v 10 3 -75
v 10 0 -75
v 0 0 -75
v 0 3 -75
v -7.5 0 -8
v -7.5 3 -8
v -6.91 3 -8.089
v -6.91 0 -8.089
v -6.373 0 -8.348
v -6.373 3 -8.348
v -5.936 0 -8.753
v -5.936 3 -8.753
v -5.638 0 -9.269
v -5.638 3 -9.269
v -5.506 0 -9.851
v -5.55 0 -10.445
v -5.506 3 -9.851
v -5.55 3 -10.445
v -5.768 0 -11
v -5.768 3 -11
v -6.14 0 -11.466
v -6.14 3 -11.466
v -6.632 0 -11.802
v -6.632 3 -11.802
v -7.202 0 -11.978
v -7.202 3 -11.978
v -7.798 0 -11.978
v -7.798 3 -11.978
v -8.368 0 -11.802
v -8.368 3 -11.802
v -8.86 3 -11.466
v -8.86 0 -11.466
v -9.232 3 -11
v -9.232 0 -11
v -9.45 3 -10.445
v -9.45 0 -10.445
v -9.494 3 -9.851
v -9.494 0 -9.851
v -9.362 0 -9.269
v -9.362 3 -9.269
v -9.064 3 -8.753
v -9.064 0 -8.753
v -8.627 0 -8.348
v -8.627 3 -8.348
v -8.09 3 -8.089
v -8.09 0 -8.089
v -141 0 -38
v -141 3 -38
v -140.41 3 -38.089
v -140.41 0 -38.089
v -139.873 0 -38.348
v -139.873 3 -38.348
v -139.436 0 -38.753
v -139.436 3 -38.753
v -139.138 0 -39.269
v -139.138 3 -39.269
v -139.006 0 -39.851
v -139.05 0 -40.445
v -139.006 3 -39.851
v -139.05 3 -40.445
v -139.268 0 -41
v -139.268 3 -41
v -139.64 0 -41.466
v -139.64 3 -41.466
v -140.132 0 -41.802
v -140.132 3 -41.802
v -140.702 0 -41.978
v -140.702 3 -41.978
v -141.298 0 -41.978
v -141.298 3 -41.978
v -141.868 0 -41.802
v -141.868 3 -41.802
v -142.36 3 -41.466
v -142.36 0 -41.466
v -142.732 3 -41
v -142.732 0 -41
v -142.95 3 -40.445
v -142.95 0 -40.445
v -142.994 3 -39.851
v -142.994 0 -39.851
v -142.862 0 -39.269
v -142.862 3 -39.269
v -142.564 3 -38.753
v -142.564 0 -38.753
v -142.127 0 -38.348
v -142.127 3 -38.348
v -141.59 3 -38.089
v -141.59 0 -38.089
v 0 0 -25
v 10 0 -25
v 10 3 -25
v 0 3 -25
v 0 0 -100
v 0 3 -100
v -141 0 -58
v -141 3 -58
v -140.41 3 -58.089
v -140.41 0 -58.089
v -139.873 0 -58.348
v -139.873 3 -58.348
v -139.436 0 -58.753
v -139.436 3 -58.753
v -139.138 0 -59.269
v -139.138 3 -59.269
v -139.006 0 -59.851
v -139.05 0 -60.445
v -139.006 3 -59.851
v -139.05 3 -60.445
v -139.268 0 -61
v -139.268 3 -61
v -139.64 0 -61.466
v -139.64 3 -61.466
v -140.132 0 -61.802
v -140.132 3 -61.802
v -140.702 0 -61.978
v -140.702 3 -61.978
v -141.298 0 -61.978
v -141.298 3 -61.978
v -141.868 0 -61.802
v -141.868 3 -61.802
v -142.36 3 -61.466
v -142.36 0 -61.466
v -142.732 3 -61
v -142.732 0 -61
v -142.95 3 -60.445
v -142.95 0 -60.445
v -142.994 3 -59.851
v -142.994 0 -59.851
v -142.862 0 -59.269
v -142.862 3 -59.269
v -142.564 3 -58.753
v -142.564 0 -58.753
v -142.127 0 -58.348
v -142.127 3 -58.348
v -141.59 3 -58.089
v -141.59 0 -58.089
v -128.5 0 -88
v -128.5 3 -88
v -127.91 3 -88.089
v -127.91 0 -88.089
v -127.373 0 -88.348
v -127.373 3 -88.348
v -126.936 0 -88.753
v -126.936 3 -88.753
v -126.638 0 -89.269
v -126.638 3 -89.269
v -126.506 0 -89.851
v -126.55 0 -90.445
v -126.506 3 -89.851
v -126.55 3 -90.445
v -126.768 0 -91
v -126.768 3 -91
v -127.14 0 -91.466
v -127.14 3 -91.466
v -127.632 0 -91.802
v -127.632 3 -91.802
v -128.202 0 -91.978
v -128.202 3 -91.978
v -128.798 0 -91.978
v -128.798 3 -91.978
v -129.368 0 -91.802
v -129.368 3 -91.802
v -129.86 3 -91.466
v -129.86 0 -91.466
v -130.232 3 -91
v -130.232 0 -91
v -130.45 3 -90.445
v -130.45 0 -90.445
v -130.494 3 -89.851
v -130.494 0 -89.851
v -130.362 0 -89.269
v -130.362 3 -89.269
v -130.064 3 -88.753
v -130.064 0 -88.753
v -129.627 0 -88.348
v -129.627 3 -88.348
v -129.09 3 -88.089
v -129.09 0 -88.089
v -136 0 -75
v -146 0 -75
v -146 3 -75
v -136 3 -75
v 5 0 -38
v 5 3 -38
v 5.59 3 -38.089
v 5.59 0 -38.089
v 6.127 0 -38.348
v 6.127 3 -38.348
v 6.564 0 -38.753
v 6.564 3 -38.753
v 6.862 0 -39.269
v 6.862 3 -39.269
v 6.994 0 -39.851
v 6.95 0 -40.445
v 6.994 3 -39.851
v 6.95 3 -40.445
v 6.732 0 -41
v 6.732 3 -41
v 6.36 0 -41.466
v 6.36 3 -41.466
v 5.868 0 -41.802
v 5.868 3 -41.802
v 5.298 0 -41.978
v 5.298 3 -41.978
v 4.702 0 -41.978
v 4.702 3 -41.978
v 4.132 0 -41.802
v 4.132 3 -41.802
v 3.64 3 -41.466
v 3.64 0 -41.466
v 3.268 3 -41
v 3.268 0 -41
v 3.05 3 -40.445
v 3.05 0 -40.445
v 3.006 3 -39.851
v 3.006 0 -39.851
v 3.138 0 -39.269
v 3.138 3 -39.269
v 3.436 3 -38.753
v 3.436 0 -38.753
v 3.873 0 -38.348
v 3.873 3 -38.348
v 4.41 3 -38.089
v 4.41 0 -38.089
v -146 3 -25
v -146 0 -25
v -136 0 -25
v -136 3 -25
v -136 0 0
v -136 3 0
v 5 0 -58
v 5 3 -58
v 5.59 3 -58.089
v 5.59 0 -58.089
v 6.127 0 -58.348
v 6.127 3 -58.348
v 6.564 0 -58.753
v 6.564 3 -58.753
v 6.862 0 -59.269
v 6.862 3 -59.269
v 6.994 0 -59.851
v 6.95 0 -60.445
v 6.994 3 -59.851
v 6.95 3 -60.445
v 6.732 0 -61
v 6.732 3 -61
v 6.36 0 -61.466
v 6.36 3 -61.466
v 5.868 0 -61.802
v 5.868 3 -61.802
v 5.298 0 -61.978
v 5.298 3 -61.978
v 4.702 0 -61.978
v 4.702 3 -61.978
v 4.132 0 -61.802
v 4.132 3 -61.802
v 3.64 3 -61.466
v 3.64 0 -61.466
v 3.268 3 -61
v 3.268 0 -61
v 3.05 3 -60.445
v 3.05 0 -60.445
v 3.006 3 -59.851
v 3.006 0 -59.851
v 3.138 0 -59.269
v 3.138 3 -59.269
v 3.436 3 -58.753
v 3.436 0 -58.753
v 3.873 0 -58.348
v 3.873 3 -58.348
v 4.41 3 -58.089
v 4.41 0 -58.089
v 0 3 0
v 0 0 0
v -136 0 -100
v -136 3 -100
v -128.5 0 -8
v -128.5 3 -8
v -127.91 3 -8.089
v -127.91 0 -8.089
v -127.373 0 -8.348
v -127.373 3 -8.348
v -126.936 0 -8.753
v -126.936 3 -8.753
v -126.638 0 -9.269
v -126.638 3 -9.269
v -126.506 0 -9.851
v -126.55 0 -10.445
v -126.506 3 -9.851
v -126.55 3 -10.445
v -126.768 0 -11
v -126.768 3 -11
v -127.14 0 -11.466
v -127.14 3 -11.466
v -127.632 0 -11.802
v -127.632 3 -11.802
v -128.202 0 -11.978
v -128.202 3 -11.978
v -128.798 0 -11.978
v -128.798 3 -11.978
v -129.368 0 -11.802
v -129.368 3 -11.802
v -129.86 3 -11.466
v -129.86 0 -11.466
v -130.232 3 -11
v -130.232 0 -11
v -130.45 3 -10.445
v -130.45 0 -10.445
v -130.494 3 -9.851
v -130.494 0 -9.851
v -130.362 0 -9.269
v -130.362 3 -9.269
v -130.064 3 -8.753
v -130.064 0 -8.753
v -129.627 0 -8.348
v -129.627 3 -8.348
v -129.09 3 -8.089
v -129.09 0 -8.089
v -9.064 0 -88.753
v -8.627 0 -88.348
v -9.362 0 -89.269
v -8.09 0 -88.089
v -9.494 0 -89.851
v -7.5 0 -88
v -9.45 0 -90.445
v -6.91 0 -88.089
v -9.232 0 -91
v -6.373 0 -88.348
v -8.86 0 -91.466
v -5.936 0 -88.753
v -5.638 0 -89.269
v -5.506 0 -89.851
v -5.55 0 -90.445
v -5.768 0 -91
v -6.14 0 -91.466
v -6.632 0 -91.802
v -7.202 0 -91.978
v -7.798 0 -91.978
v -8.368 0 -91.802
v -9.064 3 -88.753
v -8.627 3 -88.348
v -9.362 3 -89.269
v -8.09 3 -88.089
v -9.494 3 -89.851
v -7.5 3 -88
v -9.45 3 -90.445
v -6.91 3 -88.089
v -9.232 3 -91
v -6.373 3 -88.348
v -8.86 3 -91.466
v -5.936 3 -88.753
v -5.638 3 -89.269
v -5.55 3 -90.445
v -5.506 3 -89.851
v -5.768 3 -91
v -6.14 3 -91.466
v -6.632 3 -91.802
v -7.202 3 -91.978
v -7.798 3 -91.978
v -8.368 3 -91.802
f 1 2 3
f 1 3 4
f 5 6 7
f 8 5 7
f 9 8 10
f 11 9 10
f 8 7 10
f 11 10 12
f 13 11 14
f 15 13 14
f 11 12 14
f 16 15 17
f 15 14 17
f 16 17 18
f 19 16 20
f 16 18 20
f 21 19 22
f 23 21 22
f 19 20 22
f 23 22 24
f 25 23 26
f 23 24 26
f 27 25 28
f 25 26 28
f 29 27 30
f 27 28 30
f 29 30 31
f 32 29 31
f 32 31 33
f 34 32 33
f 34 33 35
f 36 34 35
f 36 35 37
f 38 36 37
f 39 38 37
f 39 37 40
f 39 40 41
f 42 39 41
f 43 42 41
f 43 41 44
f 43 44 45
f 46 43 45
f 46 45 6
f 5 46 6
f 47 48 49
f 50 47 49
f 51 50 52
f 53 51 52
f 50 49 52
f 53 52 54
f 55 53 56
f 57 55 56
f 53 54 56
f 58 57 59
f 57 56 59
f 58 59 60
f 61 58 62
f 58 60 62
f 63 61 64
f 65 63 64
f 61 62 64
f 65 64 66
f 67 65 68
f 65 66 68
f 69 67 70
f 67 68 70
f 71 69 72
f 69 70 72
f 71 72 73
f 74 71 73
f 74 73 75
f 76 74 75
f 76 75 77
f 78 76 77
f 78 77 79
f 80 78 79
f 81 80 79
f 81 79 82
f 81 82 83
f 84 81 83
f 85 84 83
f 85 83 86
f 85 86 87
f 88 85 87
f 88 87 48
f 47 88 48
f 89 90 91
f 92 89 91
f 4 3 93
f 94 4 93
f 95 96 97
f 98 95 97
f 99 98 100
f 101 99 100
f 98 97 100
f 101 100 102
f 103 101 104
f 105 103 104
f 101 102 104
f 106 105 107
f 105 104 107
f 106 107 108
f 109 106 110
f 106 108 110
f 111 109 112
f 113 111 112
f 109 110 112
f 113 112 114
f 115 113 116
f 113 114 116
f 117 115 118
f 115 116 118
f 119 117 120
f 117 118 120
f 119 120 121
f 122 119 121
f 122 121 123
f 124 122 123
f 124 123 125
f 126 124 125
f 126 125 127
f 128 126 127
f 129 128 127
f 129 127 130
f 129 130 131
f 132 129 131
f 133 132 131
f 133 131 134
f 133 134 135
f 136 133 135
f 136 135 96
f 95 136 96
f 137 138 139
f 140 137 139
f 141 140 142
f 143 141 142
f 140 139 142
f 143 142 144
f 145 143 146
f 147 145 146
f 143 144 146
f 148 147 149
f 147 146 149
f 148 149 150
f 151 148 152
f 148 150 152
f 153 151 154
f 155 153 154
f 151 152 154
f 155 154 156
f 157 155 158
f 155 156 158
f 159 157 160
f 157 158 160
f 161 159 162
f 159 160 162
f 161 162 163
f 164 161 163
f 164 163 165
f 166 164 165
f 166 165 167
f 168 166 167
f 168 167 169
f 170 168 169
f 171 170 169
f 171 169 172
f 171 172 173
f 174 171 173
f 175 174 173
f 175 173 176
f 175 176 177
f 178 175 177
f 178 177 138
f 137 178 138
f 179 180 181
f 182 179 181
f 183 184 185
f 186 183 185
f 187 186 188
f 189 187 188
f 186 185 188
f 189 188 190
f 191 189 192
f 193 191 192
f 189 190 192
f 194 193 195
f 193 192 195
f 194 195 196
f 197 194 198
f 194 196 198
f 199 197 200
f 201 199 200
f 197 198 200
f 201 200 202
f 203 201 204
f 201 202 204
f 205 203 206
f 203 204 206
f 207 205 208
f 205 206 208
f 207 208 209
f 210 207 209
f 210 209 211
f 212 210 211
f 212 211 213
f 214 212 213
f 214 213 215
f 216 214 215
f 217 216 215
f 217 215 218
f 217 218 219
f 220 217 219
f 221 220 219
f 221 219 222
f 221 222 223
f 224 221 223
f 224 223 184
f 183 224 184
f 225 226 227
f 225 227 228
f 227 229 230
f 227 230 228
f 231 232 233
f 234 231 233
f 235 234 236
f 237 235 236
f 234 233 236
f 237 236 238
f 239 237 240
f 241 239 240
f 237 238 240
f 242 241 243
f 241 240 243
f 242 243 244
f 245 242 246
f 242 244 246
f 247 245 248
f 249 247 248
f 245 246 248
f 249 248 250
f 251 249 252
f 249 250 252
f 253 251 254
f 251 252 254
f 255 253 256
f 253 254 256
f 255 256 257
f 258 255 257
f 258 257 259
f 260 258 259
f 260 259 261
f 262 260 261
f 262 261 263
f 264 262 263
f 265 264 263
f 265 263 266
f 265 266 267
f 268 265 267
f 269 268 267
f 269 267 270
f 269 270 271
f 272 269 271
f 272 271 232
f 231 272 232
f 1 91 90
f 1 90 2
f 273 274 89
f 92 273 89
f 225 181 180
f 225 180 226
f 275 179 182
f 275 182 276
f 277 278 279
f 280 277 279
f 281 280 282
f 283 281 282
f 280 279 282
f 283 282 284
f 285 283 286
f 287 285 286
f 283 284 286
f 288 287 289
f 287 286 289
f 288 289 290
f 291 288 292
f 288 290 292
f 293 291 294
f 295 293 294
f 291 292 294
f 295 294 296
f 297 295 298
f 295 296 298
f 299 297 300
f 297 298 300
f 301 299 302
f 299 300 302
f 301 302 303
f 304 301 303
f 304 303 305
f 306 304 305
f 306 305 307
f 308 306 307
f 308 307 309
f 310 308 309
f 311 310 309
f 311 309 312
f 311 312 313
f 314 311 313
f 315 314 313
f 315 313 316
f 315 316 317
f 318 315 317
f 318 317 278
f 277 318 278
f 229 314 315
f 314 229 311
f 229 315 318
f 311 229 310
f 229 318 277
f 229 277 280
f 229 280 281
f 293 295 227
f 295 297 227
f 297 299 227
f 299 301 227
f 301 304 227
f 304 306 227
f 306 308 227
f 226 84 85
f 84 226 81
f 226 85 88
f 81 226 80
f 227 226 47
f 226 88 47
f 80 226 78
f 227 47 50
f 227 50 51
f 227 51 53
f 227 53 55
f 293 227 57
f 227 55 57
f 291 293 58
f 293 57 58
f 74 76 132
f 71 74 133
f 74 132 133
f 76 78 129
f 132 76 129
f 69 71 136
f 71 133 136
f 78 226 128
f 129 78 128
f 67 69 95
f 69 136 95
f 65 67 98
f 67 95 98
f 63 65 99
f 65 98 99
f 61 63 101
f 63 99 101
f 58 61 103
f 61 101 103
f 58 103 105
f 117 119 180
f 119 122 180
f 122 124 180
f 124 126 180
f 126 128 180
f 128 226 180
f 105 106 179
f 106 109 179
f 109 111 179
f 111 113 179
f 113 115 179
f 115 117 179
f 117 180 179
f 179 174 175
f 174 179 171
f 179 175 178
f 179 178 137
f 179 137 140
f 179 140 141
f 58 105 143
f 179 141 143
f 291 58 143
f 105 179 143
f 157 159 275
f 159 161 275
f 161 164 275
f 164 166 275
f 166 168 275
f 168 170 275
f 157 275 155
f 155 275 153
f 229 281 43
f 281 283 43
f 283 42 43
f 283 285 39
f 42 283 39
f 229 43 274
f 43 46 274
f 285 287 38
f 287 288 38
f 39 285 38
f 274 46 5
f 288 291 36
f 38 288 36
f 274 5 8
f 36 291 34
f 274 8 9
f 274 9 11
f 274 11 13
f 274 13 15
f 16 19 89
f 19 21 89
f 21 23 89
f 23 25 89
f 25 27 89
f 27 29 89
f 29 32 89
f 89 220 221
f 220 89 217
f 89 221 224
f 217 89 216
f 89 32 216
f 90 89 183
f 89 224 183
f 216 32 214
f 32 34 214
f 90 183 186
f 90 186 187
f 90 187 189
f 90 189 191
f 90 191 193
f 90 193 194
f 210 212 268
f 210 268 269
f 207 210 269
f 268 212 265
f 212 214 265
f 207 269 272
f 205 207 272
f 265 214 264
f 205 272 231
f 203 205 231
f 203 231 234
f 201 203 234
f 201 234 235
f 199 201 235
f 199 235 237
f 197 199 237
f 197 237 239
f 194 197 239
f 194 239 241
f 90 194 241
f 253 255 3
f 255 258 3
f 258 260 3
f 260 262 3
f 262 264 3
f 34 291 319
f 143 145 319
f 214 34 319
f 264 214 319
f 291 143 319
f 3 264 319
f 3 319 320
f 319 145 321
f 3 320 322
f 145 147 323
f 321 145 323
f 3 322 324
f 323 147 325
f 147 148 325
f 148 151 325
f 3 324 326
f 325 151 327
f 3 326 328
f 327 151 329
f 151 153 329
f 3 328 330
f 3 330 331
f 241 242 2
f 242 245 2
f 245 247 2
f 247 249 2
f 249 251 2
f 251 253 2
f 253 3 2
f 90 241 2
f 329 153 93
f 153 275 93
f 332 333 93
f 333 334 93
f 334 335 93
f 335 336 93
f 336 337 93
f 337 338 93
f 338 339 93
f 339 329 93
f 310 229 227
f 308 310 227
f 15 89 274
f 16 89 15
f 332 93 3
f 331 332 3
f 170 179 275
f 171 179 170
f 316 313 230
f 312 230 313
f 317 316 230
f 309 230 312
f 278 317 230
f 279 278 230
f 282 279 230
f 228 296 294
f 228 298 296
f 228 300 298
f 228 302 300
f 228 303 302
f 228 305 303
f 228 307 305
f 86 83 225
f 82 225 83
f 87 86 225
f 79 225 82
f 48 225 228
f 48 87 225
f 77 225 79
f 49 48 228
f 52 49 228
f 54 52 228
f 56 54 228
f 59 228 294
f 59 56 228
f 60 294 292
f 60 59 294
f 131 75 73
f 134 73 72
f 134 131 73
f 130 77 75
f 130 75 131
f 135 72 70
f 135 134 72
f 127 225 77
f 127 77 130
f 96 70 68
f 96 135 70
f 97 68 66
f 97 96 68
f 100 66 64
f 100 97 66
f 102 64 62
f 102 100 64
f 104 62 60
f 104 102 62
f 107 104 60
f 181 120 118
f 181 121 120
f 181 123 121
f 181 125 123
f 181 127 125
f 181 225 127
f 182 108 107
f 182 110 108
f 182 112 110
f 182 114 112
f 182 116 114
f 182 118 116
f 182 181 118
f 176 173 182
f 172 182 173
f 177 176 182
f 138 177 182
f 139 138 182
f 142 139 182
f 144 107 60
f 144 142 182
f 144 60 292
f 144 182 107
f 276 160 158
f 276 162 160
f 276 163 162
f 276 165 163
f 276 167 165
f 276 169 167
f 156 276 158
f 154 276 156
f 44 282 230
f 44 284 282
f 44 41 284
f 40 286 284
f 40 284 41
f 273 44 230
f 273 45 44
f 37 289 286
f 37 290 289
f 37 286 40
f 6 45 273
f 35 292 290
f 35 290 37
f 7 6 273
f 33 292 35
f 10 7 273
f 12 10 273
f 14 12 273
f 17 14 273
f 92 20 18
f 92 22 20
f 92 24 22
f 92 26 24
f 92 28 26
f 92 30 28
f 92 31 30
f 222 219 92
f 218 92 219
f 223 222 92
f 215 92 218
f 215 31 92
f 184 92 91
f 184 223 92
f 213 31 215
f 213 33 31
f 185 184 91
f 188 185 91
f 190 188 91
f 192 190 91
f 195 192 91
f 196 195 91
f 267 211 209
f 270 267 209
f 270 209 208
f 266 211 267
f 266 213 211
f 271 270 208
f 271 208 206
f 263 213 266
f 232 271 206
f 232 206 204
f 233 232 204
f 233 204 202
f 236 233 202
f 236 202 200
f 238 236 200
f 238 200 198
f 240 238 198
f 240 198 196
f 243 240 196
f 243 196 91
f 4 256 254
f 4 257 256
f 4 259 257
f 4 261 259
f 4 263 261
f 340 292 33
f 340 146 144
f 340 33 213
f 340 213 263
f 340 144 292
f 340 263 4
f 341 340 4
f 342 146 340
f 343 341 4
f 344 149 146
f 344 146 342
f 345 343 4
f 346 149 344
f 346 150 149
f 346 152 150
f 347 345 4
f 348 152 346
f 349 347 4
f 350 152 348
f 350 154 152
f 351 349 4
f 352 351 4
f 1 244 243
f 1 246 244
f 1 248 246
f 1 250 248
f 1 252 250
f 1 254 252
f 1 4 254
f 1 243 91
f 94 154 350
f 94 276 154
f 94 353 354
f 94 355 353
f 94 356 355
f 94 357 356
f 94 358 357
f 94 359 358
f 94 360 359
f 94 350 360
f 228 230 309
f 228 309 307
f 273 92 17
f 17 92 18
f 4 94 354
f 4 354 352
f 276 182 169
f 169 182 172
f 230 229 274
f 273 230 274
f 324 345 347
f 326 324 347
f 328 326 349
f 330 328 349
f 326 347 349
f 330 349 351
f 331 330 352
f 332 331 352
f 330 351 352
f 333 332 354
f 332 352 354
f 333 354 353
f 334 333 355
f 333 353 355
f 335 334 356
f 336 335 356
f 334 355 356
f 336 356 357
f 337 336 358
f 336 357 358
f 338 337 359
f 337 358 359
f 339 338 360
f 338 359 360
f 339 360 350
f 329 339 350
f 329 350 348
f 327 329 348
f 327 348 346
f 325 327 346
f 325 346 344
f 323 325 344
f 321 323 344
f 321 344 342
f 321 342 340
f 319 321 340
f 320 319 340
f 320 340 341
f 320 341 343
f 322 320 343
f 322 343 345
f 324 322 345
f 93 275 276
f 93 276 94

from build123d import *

# Parameters (mm, degrees)
ESBO_O2_W                = 136
ESBO_O2_H                = 100
RESSALTO_EXTRUS_O1_DEPTH = 3
ESBO_O3_R                = 2
CORTE_EXTRUS_O2_DEPTH    = 10
ESBO_O5_W                = 50
ESBO_O5_H                = 3
RESSALTO_EXTRUS_O2_DEPTH = 10
ESBO_O6_W                = 50
ESBO_O6_H                = 3
RESSALTO_EXTRUS_O3_DEPTH = 10
ESBO_O7_R                = 2
CORTE_EXTRUS_O3_DEPTH    = 10


with BuildPart() as part:
    # Esboço2 → Ressalto-extrusão1 (new body)
    with BuildSketch(Plane(origin=(0, 0, 0), x_dir=(1, 0, 0), z_dir=(0, 1, 0))):
        with Locations((-68, 50)):
            Rectangle(ESBO_O2_W, ESBO_O2_H)
    extrude(amount=RESSALTO_EXTRUS_O1_DEPTH)

    # Esboço3 → Corte-extrusão2 (cut)
    with BuildSketch(Plane(origin=(0, 3, 0), x_dir=(1, 0, 0), z_dir=(0, 1, 0))):
        with Locations(Location((-128.5, 10, 0), (0, 0, 270))):
            Circle(ESBO_O3_R)
        with Locations(Location((-7.5, 10, 0), (0, 0, 270))):
            Circle(ESBO_O3_R)
        with Locations(Location((-7.5, 90, 0), (0, 0, 270))):
            Circle(ESBO_O3_R)
        with Locations(Location((-128.5, 90, 0), (0, 0, 270))):
            Circle(ESBO_O3_R)
    extrude(amount=-CORTE_EXTRUS_O2_DEPTH, mode=Mode.SUBTRACT)

    # Esboço5 → Ressalto-extrusão2 (add)
    with BuildSketch(Plane(origin=(0, 0, 0), x_dir=(0, 0, -1), z_dir=(1, 0, 0))):
        with Locations((50, 1.5)):
            Rectangle(ESBO_O5_W, ESBO_O5_H)
    extrude(amount=RESSALTO_EXTRUS_O2_DEPTH)

    # Esboço6 → Ressalto-extrusão3 (add)
    with BuildSketch(Plane.ZY.offset(136)):
        with Locations((-50, 1.5)):
            Rectangle(ESBO_O6_W, ESBO_O6_H)
    extrude(amount=RESSALTO_EXTRUS_O3_DEPTH)

    # Esboço7 → Corte-extrusão3 (cut)
    with BuildSketch(Plane(origin=(0, 3, 0), x_dir=(1, 0, 0), z_dir=(0, 1, 0))):
        with Locations(Location((5, 40, 0), (0, 0, 270))):
            Circle(ESBO_O7_R)
        with Locations(Location((5, 60, 0), (0, 0, 270))):
            Circle(ESBO_O7_R)
        with Locations(Location((-141, 60, 0), (0, 0, 270))):
            Circle(ESBO_O7_R)
        with Locations(Location((-141, 40, 0), (0, 0, 270))):
            Circle(ESBO_O7_R)
    extrude(amount=-CORTE_EXTRUS_O3_DEPTH, mode=Mode.SUBTRACT)


solid = part.part
